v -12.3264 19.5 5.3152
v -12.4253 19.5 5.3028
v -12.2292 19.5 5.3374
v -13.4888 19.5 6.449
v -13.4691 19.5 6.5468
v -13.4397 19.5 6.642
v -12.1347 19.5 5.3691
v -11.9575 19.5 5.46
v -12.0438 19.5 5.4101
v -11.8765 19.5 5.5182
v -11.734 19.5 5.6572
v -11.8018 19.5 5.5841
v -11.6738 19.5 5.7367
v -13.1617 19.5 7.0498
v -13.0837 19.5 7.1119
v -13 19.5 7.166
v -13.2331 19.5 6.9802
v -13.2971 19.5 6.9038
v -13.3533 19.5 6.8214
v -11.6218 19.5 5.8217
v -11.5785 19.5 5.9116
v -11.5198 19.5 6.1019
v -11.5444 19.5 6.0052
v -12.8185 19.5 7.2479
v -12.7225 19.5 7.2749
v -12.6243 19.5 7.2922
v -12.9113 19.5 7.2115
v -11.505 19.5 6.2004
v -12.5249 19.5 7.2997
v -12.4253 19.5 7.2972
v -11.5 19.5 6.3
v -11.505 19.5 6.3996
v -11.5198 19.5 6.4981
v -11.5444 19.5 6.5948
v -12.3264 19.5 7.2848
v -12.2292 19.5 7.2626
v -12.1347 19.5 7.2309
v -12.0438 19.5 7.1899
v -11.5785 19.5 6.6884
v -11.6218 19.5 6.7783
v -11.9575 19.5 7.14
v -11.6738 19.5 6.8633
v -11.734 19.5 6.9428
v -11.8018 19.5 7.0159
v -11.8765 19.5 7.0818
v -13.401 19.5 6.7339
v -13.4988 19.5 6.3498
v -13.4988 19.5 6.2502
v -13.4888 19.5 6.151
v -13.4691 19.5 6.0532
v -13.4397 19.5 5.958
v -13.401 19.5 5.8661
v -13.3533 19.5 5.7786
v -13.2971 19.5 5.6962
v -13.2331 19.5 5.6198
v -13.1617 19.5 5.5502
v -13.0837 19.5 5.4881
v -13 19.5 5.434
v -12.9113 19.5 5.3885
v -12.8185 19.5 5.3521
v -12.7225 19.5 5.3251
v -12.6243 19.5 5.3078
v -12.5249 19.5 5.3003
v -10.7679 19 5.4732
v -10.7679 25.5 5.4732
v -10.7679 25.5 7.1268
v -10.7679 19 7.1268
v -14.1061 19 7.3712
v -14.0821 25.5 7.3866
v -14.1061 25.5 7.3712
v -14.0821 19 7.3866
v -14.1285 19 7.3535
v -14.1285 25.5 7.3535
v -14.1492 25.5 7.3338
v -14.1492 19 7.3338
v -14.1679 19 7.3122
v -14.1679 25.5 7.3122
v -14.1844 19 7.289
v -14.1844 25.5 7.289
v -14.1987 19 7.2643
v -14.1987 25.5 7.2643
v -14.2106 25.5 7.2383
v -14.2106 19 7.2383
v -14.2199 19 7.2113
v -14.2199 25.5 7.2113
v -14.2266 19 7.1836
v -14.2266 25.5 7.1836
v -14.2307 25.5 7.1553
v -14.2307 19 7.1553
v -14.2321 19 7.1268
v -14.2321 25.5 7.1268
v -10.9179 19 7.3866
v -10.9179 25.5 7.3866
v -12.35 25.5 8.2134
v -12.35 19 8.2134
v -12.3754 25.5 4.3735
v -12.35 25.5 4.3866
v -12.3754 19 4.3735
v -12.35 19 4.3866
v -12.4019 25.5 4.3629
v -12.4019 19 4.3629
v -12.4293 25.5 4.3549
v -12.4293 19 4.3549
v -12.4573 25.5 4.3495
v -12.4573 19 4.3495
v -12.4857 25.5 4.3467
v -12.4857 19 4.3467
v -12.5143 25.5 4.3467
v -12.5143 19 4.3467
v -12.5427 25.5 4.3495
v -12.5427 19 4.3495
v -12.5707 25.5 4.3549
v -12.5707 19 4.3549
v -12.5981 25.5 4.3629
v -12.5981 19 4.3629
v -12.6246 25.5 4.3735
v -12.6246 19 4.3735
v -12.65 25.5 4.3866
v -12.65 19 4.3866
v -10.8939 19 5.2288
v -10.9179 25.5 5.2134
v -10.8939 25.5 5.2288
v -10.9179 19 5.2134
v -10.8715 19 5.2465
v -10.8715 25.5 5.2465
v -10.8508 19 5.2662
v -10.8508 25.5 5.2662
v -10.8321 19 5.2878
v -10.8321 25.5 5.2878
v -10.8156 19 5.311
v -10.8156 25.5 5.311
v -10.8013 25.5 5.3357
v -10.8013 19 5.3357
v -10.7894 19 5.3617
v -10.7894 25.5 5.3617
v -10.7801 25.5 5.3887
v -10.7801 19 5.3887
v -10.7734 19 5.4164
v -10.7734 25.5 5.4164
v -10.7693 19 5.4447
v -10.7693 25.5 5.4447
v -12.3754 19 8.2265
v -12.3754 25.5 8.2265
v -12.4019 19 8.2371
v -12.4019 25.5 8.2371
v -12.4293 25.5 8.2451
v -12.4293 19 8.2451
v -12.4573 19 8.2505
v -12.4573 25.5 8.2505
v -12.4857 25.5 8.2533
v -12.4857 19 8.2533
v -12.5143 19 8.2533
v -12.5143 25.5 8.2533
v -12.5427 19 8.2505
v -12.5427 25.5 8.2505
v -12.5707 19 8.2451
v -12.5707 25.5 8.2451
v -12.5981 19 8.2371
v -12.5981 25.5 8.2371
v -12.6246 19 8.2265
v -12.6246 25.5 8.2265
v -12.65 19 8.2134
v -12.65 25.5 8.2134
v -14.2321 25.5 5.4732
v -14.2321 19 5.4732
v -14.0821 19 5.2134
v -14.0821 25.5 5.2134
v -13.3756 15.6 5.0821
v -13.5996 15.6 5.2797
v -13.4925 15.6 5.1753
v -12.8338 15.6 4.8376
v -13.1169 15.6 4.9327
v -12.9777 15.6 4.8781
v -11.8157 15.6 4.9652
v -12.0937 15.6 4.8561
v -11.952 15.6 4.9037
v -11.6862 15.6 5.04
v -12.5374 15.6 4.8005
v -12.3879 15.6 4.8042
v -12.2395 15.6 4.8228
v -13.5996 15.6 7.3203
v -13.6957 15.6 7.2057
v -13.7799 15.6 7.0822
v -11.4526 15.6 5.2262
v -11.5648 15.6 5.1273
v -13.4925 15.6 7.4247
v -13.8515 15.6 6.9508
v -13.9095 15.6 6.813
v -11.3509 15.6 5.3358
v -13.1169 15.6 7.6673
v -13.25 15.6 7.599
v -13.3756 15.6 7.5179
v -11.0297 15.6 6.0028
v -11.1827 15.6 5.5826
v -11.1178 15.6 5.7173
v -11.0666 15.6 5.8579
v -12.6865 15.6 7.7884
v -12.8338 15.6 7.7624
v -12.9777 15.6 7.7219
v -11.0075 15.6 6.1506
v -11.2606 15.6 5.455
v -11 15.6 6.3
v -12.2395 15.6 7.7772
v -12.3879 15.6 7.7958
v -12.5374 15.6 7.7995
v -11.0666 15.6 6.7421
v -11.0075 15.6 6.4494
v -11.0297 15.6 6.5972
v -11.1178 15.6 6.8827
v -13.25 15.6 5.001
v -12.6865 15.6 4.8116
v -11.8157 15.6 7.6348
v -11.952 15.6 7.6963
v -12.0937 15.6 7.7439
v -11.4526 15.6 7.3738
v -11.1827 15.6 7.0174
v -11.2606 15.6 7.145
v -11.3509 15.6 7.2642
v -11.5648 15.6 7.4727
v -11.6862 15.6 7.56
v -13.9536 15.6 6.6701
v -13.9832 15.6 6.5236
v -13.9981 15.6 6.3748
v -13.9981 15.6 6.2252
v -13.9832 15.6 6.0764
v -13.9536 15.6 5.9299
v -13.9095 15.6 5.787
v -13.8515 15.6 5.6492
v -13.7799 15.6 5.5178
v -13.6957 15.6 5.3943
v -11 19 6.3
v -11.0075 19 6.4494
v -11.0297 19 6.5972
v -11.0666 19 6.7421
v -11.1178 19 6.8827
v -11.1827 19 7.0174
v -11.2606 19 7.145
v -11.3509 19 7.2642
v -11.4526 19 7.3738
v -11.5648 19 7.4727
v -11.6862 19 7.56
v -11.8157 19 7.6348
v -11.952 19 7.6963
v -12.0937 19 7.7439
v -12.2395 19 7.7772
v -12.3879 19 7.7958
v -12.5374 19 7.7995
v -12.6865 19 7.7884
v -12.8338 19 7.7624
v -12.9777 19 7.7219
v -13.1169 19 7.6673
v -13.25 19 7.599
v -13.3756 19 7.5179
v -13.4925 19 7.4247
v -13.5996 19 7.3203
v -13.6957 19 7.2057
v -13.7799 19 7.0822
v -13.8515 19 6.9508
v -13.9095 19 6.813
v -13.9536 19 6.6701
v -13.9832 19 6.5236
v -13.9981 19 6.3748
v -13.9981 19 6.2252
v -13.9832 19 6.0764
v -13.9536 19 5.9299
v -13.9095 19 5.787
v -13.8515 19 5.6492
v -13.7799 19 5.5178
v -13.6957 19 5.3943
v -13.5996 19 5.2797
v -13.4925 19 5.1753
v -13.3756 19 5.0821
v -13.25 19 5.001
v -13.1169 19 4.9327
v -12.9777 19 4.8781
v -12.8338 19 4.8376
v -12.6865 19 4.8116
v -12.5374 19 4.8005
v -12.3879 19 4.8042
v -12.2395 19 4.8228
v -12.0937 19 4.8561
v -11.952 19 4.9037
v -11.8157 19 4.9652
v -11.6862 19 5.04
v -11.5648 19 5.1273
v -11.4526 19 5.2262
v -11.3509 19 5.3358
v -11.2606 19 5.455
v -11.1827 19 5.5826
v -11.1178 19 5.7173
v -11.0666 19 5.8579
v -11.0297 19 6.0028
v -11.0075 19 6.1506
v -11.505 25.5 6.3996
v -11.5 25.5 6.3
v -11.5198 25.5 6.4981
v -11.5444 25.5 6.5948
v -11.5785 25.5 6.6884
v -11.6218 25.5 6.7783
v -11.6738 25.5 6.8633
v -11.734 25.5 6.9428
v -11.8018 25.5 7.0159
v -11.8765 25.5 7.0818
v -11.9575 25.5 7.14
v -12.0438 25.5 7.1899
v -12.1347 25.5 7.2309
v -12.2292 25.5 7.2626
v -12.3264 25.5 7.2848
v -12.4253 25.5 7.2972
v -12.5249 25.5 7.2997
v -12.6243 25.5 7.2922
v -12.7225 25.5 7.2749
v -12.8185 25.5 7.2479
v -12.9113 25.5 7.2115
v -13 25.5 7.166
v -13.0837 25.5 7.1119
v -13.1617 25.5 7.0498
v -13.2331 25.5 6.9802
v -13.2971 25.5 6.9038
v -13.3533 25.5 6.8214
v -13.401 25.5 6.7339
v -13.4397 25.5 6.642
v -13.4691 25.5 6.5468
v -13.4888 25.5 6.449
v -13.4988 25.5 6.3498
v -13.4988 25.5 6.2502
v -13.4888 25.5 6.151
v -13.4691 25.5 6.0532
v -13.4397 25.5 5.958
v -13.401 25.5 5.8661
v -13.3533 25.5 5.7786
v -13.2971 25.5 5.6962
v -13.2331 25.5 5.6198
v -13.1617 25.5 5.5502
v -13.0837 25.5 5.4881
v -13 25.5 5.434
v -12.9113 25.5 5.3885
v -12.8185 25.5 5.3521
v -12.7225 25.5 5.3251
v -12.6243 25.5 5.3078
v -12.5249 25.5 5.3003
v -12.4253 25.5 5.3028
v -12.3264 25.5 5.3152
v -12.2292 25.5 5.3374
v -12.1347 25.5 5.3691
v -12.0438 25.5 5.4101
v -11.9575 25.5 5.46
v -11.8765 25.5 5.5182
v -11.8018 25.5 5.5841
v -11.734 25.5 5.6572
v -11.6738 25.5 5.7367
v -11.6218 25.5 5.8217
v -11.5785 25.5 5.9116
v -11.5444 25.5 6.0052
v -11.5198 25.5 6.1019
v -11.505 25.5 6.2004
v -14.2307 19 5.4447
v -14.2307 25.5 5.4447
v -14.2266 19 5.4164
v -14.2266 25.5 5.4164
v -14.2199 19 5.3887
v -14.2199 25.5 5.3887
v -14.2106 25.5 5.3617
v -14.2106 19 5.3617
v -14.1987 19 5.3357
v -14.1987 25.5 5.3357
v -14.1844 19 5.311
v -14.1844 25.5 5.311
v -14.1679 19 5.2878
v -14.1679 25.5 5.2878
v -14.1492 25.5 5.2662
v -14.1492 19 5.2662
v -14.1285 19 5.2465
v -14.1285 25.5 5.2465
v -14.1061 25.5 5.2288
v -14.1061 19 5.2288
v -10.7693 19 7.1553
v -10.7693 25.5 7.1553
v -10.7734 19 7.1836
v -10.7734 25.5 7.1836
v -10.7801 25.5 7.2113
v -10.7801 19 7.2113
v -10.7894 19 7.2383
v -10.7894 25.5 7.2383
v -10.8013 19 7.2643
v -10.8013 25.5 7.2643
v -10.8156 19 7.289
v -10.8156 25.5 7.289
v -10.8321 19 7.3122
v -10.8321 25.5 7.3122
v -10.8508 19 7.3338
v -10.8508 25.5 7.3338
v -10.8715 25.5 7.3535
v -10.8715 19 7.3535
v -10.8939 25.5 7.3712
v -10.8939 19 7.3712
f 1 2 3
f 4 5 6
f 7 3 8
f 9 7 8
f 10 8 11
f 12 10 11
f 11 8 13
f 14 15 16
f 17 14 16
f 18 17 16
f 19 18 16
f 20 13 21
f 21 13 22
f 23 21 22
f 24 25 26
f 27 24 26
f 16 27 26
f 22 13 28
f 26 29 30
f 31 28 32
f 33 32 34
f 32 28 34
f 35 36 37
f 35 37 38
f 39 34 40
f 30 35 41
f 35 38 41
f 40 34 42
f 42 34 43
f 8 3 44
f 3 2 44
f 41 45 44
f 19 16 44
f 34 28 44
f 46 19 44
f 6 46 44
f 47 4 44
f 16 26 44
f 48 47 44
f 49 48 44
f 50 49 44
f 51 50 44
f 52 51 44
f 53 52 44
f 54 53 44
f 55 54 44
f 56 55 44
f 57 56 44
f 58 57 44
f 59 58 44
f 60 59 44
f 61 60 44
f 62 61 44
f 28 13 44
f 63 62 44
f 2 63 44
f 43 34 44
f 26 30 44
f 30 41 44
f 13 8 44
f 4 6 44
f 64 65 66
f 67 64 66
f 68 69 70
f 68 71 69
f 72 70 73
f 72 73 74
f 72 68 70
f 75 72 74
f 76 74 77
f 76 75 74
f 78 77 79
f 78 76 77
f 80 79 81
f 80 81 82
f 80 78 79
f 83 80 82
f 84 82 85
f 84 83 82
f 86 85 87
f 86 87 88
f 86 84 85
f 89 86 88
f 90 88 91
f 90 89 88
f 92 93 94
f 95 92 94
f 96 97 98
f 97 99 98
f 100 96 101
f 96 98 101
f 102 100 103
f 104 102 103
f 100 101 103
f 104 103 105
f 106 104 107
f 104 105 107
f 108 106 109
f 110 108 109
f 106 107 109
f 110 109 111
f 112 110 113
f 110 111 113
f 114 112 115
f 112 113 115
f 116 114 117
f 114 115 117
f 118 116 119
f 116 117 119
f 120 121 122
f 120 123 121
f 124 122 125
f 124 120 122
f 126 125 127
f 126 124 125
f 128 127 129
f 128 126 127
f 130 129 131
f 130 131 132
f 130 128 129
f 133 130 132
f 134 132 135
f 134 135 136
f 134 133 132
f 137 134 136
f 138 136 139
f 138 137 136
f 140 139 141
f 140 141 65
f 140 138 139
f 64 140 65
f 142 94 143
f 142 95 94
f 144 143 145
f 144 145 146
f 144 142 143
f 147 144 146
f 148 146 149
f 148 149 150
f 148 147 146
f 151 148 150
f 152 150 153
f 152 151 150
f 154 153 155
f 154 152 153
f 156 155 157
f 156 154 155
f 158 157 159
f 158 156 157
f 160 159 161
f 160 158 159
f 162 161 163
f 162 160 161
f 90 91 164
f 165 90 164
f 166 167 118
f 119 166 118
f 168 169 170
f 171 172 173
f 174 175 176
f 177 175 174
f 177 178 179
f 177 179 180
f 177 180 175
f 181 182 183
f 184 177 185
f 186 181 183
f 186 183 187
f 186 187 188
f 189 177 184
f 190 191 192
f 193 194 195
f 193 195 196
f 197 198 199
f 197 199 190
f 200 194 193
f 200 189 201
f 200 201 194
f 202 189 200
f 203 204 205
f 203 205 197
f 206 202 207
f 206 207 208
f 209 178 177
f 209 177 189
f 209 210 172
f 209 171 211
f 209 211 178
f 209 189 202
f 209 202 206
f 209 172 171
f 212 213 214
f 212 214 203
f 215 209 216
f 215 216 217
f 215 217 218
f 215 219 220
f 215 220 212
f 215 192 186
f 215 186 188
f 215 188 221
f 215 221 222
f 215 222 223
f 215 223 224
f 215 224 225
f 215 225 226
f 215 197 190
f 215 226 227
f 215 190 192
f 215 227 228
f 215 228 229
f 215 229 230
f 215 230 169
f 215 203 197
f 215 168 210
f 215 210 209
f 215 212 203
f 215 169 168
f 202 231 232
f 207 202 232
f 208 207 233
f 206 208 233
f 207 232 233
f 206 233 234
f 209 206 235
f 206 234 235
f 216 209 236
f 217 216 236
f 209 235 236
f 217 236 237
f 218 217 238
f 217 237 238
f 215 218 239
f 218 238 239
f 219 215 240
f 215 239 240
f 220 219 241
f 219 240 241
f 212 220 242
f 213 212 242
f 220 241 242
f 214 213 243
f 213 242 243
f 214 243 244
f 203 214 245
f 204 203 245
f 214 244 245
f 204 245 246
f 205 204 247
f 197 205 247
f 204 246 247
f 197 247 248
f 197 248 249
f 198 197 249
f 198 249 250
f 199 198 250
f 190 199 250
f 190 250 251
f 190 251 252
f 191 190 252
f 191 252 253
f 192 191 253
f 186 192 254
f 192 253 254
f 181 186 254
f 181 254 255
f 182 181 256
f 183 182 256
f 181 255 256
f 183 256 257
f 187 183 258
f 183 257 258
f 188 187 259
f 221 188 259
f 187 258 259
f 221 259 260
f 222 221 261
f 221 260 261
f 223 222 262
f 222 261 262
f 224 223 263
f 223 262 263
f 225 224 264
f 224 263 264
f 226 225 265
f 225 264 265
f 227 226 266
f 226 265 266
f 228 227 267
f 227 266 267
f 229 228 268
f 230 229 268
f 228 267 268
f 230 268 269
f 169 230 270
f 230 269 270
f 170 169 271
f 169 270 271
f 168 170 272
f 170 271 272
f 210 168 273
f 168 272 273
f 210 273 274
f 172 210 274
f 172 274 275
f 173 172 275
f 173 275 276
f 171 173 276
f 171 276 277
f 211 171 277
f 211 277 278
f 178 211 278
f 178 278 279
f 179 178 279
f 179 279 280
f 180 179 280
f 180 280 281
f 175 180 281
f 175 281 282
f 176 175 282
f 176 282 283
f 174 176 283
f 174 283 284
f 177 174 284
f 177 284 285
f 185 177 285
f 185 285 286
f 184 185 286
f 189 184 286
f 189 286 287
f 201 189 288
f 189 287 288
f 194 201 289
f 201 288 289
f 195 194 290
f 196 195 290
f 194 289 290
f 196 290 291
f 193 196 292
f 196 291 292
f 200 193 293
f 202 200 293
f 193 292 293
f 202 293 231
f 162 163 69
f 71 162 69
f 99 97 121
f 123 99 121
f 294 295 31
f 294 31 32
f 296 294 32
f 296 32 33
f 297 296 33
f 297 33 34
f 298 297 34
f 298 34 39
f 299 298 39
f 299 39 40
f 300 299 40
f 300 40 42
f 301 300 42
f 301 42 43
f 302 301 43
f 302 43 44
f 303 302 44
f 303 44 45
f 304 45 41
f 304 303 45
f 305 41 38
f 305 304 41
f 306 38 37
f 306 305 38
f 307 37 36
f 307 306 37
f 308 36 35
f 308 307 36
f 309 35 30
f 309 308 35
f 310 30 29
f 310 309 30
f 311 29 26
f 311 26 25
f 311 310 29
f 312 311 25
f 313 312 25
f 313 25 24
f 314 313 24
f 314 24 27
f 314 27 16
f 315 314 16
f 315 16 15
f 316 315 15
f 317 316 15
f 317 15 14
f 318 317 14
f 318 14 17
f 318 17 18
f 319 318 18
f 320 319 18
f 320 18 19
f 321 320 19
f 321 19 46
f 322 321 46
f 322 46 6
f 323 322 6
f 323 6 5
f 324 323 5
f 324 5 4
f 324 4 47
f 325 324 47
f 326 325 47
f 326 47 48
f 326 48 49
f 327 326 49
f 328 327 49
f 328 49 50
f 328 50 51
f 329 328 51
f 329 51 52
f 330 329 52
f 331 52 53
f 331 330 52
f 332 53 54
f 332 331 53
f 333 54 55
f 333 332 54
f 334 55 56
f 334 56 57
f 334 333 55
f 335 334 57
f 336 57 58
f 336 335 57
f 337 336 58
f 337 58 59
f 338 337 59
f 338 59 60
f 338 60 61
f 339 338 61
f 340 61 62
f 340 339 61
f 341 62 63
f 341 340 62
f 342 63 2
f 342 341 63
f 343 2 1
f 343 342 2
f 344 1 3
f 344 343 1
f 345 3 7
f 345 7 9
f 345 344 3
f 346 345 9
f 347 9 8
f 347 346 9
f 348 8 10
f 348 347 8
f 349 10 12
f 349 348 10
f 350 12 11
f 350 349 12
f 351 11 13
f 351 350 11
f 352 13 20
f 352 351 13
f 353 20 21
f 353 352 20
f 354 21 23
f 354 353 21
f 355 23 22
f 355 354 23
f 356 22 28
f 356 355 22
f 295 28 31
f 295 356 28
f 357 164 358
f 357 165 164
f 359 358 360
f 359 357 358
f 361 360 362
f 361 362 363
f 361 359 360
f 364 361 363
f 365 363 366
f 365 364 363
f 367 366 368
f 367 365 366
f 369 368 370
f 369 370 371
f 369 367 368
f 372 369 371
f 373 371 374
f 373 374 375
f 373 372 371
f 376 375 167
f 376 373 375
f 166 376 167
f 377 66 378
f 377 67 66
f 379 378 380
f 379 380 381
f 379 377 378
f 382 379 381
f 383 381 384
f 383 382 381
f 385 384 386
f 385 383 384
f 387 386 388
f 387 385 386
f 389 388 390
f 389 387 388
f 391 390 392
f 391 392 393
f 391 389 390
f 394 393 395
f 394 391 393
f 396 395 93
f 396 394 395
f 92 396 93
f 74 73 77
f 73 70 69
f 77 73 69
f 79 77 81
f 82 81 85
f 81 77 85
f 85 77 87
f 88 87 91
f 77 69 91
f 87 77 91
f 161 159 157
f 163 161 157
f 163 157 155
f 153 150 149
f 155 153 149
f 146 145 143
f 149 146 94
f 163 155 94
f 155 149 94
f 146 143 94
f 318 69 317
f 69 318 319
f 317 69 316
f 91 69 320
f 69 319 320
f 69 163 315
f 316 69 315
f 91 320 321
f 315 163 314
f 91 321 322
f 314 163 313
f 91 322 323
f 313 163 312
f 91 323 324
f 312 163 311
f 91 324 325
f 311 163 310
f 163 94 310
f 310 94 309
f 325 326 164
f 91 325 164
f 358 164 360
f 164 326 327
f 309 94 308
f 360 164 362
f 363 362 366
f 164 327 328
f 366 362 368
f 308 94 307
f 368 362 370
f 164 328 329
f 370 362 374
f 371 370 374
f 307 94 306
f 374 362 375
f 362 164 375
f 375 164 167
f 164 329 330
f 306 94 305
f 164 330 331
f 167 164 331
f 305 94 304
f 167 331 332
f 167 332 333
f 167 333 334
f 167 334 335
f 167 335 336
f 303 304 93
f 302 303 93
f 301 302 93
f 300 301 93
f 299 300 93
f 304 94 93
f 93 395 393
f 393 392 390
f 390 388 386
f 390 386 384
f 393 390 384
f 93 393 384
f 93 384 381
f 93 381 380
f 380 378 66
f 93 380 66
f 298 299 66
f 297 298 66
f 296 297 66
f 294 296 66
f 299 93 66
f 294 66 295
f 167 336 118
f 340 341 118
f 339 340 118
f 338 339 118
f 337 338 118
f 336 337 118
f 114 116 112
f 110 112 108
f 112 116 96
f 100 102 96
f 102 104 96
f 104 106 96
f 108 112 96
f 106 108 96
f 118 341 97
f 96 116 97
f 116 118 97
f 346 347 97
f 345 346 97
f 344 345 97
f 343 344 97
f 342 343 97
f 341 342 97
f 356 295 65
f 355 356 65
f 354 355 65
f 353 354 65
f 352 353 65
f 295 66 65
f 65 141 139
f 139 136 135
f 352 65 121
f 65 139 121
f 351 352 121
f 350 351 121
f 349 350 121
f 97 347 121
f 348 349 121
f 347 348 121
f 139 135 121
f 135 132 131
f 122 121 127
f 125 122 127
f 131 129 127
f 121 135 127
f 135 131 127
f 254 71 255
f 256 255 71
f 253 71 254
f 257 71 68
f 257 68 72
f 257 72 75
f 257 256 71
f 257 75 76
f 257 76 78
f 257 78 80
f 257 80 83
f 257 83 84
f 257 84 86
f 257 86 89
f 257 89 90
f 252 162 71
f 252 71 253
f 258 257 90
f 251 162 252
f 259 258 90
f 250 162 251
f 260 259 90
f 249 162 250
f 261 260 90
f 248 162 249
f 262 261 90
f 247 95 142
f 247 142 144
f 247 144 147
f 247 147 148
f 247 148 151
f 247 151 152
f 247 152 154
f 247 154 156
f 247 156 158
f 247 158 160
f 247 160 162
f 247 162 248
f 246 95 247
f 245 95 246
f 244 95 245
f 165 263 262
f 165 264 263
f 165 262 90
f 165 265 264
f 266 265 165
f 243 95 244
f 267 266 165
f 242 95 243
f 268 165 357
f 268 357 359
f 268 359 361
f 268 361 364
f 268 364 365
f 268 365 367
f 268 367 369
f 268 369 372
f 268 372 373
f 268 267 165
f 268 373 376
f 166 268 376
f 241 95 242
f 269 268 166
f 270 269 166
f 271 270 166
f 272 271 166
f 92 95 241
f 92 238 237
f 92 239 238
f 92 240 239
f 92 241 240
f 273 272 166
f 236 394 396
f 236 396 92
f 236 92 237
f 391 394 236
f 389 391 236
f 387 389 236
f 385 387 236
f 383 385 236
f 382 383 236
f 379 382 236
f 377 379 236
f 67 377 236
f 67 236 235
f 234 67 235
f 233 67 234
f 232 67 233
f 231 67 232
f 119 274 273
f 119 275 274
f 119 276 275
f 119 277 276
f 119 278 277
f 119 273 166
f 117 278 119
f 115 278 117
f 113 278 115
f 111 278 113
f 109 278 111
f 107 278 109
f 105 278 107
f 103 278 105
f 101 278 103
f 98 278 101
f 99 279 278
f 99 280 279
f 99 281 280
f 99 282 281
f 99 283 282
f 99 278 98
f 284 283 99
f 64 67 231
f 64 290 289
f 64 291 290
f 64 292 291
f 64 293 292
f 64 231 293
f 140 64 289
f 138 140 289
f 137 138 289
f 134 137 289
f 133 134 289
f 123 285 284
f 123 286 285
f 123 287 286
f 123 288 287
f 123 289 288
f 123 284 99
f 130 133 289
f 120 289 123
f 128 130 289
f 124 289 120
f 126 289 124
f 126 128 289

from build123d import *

# Parameters (mm, degrees)
PRISM001_DEPTH    = 6.5
FILLET018_R       = 0.3
CYLINDER012_R     = 1.5
CYLINDER012_DEPTH = 3.4
CYLINDER013_R     = 1
CYLINDER013_DEPTH = 6.5


with BuildPart() as part:
    # Prism001 → Prism001 (join)
    with BuildSketch(Plane(origin=(12.5, 25.5, 6.3), x_dir=(0, 0, -1), z_dir=(0, -1, 0))):
        Polygon((2, 0), (1, 1.732051), (-1, 1.732051), (-2, 0), (-1, -1.732051), (1, -1.732051), align=None)
    extrude(amount=PRISM001_DEPTH)

    # Fillet018
    fillet018_edges = [part.edges().sort_by_distance(p)[0] for p in [
        (12.5, 22.25, 8.3),
        (14.232051, 22.25, 7.3),
        (10.767949, 22.25, 7.3),
        (14.232051, 22.25, 5.3),
        (12.5, 22.25, 4.3),
        (10.767949, 22.25, 5.3),
    ]]
    fillet(fillet018_edges, radius=FILLET018_R)

    # Cylinder012 → Cylinder012 (join)
    with BuildSketch(Plane(origin=(12.5, 19, 6.3), x_dir=(1, 0, 0), z_dir=(0, -1, 0))):
        Circle(CYLINDER012_R)
    extrude(amount=CYLINDER012_DEPTH)

    # Cylinder013 → Cylinder013 (cut)
    with BuildSketch(Plane(origin=(12.5, 26, 6.3), x_dir=(1, 0, 0), z_dir=(0, -1, 0))):
        Circle(CYLINDER013_R)
    extrude(amount=CYLINDER013_DEPTH, mode=Mode.SUBTRACT)


with BuildPart() as part_1:
    # Body007 placement: moved
    add(part.part.moved(Location((-25, 0, 0))))


solid = part_1.part
